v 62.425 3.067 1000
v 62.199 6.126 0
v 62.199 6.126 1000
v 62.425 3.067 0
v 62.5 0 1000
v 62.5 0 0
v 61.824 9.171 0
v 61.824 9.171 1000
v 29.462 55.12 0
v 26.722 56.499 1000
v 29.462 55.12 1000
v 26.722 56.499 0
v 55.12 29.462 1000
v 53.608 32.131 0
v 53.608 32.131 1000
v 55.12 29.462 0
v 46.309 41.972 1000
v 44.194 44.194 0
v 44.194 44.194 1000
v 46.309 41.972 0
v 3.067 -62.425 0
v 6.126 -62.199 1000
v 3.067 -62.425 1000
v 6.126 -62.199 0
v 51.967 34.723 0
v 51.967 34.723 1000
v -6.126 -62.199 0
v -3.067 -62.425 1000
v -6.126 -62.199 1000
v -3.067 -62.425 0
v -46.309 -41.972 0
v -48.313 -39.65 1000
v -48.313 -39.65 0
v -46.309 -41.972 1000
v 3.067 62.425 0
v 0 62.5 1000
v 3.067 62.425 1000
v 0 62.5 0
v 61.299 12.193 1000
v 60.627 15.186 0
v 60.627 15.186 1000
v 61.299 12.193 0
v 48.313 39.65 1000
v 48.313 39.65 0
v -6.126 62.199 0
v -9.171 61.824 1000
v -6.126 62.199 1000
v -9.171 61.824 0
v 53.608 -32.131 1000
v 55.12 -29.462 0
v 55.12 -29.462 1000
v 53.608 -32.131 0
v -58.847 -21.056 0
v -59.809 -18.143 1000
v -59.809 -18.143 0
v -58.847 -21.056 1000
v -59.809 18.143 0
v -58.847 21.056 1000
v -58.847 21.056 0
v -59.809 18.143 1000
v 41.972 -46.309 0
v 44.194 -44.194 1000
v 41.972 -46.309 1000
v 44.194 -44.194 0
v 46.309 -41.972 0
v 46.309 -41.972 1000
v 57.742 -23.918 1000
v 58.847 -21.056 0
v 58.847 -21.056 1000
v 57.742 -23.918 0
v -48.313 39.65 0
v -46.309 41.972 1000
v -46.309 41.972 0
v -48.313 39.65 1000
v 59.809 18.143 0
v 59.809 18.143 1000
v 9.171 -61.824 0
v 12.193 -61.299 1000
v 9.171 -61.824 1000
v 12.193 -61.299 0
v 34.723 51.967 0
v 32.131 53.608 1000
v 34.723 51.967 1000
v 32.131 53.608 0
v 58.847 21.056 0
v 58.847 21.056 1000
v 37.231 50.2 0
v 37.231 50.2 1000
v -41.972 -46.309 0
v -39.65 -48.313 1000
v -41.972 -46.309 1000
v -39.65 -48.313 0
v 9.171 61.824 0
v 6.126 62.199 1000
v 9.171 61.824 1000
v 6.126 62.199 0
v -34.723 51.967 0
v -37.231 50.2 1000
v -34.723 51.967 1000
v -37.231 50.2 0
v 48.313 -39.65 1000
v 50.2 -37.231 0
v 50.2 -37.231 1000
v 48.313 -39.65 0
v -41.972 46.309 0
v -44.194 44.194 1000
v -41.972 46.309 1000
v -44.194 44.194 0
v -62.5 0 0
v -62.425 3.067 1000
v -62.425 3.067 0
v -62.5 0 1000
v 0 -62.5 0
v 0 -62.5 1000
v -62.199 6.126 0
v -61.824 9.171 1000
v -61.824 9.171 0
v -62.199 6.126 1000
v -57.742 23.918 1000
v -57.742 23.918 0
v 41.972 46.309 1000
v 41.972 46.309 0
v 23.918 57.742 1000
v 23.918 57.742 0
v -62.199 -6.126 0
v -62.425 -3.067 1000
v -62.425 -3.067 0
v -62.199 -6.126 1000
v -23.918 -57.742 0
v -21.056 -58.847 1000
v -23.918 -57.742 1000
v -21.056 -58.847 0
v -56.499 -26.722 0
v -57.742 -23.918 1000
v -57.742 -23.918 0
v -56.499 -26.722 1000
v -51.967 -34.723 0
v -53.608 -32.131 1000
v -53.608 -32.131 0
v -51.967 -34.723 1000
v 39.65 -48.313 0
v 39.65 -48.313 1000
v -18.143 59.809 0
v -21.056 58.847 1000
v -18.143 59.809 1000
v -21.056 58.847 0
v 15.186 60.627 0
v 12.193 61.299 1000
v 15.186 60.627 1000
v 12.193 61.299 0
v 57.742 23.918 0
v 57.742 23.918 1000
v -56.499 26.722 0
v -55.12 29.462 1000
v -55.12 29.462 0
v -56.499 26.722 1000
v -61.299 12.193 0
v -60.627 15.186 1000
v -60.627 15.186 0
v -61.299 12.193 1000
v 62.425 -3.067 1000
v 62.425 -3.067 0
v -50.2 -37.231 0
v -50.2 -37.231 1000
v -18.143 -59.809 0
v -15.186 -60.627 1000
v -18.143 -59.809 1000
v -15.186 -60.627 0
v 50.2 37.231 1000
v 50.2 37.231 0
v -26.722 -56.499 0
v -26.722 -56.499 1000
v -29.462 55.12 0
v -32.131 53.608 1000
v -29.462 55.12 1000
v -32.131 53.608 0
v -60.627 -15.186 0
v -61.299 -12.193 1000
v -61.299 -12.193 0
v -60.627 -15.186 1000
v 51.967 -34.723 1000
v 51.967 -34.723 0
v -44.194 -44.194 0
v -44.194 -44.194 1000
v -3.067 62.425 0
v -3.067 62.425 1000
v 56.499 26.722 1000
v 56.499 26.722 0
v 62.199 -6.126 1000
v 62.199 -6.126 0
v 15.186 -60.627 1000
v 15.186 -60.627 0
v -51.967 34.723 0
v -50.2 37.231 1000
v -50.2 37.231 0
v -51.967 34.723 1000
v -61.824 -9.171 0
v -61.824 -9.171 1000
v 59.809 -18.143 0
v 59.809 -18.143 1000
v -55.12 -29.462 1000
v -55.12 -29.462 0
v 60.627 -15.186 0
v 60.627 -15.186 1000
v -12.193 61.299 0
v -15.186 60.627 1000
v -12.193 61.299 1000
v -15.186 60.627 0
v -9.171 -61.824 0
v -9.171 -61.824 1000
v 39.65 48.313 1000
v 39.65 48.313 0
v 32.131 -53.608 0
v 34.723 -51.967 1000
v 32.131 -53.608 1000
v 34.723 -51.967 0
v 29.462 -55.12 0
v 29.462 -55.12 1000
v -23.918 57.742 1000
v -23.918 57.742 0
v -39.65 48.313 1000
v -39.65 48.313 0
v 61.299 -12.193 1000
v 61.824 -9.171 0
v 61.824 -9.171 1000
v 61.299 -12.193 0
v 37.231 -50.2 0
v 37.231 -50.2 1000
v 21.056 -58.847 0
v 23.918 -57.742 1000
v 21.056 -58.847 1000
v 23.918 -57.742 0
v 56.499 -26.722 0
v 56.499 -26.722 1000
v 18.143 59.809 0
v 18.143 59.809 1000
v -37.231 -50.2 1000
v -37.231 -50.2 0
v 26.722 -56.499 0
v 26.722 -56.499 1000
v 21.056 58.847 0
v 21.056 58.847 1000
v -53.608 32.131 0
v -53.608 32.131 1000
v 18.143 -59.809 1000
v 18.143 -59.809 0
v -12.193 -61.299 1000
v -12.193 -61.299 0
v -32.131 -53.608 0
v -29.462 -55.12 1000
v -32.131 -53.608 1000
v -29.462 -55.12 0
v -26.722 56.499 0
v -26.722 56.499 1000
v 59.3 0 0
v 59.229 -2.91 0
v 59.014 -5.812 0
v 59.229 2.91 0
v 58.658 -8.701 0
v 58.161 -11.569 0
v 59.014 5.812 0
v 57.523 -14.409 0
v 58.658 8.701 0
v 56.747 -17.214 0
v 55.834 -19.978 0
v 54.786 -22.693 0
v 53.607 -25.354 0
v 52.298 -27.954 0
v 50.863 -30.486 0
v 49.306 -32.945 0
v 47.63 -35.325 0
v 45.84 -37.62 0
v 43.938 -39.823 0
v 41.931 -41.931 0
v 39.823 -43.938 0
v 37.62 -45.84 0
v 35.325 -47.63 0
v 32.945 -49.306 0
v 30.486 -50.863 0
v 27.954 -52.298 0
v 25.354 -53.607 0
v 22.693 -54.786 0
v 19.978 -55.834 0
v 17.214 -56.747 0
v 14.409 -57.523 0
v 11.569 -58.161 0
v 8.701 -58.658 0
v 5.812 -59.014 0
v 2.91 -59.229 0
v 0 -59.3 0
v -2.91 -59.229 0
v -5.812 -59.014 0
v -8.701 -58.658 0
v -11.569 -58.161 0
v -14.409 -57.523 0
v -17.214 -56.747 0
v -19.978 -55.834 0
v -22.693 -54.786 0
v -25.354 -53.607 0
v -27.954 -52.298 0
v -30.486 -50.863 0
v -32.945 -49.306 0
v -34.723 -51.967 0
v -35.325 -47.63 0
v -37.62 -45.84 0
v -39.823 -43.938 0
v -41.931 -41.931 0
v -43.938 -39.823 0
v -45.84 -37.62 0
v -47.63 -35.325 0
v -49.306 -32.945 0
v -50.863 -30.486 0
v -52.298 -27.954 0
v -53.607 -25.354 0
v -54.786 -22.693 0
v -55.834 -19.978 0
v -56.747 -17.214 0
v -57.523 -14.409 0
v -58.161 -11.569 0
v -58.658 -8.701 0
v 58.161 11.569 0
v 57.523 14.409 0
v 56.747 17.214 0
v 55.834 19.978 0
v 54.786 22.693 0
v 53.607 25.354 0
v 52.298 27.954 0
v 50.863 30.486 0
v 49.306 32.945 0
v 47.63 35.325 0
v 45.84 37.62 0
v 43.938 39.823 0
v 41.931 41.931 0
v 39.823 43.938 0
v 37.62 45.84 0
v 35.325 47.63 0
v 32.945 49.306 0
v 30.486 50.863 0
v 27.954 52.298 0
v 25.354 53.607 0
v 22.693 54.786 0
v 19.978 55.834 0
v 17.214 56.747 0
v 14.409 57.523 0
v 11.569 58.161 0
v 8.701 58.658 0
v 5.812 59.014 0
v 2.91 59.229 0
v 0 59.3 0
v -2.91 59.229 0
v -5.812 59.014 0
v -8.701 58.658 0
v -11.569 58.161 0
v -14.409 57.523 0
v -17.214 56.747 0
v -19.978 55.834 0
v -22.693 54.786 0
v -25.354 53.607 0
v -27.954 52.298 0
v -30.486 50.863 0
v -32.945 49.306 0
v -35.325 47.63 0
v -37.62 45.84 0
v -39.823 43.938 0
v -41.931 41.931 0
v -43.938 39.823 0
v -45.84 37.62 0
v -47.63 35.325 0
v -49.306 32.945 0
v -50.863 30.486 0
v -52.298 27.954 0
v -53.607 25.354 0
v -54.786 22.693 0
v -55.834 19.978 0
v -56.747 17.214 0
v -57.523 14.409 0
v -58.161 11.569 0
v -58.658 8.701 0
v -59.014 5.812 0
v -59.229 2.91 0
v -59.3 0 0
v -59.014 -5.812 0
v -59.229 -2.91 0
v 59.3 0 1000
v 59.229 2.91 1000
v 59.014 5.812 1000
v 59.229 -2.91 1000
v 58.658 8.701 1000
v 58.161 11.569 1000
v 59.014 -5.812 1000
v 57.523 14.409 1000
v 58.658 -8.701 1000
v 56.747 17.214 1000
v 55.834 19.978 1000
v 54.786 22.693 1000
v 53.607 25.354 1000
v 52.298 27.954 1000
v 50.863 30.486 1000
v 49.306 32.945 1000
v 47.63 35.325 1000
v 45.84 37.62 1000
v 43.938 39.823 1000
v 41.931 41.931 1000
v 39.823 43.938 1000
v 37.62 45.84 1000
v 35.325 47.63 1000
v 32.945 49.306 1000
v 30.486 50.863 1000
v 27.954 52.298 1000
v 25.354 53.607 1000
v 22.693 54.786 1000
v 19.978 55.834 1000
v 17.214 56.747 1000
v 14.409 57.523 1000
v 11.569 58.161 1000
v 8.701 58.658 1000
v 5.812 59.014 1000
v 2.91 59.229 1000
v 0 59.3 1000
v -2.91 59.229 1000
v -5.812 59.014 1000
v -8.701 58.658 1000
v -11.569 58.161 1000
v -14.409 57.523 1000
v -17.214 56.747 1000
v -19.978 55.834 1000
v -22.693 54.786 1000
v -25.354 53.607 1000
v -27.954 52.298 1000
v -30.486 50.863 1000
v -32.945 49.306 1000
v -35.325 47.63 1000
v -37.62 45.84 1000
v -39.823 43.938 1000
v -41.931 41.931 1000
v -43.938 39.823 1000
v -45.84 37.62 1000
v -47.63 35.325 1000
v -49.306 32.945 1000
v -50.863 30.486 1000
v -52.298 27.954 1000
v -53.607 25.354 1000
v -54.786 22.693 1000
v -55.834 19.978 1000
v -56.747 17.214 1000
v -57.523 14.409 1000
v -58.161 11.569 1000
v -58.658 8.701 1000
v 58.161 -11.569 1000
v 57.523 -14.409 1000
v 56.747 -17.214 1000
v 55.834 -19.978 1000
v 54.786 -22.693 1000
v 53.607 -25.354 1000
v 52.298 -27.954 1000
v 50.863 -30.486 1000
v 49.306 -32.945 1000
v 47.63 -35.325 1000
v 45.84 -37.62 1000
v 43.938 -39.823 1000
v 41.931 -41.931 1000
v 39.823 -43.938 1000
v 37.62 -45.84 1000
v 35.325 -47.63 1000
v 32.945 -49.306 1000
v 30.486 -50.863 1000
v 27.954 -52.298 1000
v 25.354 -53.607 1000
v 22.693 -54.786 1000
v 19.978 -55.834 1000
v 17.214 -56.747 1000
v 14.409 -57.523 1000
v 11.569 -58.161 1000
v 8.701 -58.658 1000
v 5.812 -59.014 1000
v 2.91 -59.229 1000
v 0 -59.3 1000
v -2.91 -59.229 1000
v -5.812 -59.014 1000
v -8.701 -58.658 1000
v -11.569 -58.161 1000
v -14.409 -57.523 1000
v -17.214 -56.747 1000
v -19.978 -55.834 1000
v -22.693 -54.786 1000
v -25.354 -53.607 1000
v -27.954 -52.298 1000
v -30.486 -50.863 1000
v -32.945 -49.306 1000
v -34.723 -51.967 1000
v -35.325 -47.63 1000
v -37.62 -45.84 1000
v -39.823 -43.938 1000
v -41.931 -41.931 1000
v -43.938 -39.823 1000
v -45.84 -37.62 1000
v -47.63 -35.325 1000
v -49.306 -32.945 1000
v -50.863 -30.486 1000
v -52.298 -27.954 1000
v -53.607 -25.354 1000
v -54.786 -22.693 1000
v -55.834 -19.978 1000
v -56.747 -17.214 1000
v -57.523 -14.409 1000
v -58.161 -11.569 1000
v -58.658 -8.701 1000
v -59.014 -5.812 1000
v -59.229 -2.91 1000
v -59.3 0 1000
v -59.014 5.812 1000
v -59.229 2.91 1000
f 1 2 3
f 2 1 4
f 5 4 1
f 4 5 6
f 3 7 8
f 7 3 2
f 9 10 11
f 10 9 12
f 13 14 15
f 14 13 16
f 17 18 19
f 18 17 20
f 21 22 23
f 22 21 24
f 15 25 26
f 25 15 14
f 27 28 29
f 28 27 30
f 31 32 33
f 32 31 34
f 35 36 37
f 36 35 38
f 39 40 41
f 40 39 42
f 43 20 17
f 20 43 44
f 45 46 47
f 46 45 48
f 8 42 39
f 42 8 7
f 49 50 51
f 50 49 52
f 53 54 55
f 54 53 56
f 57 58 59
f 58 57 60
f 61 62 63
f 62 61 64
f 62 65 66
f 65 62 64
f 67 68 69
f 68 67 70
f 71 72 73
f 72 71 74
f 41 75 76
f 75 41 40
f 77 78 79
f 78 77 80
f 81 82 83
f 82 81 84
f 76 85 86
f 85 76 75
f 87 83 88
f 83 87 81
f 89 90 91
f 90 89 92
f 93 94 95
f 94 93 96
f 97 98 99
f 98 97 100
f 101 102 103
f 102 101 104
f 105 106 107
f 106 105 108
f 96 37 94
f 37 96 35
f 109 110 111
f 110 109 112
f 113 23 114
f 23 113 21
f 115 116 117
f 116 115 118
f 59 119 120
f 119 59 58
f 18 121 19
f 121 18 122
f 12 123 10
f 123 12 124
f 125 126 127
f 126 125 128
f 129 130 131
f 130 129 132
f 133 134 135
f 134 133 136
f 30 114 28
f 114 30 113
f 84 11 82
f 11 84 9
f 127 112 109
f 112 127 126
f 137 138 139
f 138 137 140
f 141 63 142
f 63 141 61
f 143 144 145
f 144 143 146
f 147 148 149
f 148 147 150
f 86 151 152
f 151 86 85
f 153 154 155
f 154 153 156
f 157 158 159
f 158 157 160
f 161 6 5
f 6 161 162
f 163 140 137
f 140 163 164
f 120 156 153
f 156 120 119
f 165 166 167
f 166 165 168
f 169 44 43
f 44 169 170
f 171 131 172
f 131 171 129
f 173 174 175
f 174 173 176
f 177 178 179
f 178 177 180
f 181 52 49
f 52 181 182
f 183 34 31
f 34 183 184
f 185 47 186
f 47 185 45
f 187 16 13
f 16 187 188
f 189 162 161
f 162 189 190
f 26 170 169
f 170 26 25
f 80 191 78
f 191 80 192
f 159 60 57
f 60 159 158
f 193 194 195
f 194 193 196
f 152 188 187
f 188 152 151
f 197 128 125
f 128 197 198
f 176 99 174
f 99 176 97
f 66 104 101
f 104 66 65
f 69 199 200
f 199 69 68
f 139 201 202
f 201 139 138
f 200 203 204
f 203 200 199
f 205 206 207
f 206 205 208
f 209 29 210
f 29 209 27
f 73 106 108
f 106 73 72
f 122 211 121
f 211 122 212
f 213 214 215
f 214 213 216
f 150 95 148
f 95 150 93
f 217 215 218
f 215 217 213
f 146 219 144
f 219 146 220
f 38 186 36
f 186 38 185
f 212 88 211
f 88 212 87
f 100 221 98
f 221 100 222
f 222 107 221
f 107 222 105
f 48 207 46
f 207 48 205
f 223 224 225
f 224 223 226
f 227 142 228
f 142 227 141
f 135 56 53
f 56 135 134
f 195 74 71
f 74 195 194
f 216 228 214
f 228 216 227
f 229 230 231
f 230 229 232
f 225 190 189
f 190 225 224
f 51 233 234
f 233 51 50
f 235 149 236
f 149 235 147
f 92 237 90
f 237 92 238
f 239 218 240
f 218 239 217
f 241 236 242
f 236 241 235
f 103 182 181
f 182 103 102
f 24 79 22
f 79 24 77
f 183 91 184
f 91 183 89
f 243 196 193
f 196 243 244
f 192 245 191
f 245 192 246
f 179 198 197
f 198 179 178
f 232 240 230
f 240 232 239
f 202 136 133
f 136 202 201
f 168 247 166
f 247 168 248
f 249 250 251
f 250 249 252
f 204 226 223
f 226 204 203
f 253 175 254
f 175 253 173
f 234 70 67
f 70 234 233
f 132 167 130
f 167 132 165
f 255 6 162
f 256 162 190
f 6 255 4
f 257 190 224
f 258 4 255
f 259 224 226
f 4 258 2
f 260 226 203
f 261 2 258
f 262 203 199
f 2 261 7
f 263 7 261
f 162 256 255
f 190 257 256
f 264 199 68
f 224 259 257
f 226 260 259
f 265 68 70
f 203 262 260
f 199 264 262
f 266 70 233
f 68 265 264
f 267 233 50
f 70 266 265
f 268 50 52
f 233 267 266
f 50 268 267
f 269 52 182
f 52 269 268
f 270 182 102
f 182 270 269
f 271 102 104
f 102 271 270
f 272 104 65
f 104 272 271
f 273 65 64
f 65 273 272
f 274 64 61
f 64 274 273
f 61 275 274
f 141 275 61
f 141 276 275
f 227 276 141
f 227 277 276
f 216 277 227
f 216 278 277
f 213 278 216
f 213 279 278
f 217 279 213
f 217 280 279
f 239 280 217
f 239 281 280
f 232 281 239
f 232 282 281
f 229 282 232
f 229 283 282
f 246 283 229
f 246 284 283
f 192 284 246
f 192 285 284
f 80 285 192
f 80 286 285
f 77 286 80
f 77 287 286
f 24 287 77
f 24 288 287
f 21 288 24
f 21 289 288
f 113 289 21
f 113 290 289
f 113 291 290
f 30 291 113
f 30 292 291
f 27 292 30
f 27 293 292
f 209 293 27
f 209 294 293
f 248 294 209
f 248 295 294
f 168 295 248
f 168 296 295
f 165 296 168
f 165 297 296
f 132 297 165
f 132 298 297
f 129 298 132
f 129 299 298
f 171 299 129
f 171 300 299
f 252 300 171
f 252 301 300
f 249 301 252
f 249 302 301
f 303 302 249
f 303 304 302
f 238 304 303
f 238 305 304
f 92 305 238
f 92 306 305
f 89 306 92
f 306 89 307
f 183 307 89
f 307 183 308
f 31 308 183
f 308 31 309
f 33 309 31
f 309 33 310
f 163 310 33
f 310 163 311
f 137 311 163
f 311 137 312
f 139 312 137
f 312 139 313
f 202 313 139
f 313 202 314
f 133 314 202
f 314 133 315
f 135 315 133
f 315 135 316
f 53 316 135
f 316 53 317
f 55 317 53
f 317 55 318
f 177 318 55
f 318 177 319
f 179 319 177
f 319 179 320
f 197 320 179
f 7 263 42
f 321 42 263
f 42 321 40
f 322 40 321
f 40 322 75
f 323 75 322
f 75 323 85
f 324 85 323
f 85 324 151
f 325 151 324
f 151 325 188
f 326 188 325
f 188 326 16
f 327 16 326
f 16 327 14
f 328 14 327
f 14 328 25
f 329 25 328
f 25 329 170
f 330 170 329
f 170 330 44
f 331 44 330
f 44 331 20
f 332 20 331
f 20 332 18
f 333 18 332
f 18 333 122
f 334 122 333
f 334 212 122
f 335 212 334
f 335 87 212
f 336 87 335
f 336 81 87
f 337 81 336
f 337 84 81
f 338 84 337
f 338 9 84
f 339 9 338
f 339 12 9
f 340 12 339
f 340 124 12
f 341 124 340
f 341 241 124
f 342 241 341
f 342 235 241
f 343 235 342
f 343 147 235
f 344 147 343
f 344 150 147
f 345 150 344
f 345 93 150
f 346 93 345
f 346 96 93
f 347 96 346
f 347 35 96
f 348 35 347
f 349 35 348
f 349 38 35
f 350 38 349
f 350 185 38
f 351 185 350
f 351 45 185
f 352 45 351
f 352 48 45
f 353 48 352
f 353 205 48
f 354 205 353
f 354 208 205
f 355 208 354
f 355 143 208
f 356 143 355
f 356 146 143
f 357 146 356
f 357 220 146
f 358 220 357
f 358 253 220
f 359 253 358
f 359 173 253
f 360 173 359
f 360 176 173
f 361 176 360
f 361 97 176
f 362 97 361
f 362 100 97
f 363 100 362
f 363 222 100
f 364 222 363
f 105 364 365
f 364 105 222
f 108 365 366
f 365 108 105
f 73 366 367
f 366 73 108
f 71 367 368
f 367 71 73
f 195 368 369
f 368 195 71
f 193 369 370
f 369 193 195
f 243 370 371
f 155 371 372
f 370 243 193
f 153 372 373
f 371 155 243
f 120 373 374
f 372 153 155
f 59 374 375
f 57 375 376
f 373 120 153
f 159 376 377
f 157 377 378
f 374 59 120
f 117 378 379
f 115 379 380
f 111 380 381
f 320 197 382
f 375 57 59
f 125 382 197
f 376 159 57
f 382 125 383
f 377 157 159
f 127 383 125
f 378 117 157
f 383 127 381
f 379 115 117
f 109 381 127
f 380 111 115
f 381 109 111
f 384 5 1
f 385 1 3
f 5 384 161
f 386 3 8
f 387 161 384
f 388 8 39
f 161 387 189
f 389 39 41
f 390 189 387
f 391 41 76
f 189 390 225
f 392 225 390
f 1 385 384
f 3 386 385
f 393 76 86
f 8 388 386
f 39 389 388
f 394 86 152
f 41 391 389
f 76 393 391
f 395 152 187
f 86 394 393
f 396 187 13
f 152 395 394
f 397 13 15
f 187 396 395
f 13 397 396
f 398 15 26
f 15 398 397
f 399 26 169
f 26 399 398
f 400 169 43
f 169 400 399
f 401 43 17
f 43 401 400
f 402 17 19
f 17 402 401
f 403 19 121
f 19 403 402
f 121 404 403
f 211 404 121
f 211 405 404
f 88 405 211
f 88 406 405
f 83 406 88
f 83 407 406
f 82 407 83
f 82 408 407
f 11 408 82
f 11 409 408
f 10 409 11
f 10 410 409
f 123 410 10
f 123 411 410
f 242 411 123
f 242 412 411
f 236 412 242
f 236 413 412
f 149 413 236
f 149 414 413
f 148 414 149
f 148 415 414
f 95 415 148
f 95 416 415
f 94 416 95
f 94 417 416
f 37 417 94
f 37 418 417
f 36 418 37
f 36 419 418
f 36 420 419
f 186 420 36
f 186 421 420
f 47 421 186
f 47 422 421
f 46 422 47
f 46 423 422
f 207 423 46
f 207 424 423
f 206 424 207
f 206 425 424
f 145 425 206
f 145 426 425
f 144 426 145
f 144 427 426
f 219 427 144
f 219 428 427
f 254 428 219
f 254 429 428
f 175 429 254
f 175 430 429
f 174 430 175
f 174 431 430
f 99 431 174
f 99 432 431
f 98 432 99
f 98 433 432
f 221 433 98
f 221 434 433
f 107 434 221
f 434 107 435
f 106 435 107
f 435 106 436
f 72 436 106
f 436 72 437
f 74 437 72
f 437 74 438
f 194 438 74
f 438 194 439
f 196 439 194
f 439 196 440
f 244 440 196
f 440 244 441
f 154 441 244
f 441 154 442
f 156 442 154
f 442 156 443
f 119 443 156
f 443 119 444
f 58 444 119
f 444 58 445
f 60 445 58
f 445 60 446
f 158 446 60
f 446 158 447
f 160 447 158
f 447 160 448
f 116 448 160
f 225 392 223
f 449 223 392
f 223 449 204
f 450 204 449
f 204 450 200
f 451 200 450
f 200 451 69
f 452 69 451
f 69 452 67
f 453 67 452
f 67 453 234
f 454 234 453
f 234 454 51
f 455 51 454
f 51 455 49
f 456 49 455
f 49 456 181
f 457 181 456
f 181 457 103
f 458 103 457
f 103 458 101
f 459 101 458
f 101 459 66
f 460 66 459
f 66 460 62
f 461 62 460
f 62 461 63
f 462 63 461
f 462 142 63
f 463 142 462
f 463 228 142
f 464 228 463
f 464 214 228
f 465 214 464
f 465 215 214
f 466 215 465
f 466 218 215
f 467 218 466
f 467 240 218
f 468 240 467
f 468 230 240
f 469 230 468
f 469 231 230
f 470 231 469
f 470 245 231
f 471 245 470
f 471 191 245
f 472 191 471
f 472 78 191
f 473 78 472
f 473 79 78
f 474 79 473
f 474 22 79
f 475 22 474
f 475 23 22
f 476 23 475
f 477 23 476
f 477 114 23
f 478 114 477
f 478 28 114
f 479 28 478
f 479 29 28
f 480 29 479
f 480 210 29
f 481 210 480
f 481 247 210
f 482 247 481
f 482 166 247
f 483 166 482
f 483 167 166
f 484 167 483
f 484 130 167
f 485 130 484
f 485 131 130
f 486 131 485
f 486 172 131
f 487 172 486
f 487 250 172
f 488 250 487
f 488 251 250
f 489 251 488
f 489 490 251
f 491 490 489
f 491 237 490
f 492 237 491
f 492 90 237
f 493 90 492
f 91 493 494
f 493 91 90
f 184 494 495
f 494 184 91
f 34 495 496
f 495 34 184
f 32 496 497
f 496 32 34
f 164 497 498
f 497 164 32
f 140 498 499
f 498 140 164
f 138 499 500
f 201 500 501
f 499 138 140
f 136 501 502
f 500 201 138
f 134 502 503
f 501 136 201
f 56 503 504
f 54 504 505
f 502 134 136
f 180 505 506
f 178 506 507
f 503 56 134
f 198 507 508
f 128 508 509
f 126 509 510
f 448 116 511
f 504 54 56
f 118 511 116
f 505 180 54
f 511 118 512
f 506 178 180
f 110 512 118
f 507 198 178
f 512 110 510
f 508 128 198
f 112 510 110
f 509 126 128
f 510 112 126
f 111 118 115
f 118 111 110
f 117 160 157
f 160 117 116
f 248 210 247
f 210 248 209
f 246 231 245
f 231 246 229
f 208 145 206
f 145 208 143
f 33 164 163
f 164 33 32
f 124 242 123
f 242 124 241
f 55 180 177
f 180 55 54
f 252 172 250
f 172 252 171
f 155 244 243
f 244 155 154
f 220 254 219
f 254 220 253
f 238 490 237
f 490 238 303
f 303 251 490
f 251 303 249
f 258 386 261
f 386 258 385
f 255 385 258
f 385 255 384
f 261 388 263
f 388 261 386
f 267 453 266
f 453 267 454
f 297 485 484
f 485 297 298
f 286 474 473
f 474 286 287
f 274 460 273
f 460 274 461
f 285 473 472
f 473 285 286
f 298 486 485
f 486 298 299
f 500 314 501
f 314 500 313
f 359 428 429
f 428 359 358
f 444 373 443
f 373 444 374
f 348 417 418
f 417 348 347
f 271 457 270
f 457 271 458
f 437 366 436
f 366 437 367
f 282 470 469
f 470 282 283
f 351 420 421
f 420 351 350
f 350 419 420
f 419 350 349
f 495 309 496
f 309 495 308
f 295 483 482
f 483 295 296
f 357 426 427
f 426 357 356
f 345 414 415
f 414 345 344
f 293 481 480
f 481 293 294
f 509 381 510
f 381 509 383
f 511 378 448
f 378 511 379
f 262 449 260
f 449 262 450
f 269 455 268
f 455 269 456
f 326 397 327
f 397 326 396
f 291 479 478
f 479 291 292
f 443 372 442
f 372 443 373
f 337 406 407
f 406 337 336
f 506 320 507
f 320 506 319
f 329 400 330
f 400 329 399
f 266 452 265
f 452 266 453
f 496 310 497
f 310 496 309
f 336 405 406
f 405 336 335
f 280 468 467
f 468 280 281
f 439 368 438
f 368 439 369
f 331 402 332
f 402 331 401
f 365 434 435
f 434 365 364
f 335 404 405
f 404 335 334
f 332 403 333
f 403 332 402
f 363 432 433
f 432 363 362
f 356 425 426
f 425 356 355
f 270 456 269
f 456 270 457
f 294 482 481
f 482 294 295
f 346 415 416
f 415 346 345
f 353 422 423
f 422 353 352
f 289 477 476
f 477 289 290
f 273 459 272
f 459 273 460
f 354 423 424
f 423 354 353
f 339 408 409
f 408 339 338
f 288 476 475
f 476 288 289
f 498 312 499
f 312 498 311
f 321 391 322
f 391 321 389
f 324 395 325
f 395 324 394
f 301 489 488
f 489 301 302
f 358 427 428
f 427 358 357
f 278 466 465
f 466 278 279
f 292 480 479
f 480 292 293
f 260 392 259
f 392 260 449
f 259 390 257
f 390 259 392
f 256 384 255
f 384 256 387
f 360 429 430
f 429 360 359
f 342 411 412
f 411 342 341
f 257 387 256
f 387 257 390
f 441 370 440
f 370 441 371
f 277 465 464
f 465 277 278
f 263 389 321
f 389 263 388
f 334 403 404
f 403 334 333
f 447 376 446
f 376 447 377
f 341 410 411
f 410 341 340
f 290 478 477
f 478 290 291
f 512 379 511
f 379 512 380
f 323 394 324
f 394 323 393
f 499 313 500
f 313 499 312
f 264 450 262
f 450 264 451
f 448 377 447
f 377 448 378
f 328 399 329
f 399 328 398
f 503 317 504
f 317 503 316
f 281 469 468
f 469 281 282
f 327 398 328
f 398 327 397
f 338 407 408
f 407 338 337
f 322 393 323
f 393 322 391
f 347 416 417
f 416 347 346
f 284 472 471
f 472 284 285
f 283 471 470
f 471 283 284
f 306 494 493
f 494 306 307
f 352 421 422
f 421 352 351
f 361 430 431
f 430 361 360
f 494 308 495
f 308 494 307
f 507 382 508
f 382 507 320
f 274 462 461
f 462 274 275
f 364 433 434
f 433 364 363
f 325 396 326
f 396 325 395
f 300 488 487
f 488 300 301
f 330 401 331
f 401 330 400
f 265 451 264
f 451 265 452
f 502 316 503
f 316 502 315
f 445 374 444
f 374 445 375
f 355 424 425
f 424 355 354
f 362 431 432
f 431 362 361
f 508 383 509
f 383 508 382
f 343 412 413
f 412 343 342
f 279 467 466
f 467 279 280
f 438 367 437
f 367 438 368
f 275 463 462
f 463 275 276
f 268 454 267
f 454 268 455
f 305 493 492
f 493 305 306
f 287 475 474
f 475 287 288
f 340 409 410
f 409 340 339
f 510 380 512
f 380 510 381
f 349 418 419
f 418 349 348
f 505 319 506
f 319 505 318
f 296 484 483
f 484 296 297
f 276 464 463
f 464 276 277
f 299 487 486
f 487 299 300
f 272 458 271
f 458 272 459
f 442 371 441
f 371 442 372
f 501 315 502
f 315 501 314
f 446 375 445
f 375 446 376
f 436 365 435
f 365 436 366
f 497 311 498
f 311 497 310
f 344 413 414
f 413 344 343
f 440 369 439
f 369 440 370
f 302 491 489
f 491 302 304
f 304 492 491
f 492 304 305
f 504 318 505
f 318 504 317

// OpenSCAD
$fn = 128;

// HT pipe parameters (approximate for HT 125)
od = 125;          // outer diameter (mm)
wall = 3.2;        // wall thickness (mm) typical for HT 125
len = 1000;        // length (mm)

id = od - 2*wall;

difference() {
    cylinder(h = len, d = od, center = false);
    translate([0,0,-0.5])
        cylinder(h = len + 1, d = id, center = false);
}
